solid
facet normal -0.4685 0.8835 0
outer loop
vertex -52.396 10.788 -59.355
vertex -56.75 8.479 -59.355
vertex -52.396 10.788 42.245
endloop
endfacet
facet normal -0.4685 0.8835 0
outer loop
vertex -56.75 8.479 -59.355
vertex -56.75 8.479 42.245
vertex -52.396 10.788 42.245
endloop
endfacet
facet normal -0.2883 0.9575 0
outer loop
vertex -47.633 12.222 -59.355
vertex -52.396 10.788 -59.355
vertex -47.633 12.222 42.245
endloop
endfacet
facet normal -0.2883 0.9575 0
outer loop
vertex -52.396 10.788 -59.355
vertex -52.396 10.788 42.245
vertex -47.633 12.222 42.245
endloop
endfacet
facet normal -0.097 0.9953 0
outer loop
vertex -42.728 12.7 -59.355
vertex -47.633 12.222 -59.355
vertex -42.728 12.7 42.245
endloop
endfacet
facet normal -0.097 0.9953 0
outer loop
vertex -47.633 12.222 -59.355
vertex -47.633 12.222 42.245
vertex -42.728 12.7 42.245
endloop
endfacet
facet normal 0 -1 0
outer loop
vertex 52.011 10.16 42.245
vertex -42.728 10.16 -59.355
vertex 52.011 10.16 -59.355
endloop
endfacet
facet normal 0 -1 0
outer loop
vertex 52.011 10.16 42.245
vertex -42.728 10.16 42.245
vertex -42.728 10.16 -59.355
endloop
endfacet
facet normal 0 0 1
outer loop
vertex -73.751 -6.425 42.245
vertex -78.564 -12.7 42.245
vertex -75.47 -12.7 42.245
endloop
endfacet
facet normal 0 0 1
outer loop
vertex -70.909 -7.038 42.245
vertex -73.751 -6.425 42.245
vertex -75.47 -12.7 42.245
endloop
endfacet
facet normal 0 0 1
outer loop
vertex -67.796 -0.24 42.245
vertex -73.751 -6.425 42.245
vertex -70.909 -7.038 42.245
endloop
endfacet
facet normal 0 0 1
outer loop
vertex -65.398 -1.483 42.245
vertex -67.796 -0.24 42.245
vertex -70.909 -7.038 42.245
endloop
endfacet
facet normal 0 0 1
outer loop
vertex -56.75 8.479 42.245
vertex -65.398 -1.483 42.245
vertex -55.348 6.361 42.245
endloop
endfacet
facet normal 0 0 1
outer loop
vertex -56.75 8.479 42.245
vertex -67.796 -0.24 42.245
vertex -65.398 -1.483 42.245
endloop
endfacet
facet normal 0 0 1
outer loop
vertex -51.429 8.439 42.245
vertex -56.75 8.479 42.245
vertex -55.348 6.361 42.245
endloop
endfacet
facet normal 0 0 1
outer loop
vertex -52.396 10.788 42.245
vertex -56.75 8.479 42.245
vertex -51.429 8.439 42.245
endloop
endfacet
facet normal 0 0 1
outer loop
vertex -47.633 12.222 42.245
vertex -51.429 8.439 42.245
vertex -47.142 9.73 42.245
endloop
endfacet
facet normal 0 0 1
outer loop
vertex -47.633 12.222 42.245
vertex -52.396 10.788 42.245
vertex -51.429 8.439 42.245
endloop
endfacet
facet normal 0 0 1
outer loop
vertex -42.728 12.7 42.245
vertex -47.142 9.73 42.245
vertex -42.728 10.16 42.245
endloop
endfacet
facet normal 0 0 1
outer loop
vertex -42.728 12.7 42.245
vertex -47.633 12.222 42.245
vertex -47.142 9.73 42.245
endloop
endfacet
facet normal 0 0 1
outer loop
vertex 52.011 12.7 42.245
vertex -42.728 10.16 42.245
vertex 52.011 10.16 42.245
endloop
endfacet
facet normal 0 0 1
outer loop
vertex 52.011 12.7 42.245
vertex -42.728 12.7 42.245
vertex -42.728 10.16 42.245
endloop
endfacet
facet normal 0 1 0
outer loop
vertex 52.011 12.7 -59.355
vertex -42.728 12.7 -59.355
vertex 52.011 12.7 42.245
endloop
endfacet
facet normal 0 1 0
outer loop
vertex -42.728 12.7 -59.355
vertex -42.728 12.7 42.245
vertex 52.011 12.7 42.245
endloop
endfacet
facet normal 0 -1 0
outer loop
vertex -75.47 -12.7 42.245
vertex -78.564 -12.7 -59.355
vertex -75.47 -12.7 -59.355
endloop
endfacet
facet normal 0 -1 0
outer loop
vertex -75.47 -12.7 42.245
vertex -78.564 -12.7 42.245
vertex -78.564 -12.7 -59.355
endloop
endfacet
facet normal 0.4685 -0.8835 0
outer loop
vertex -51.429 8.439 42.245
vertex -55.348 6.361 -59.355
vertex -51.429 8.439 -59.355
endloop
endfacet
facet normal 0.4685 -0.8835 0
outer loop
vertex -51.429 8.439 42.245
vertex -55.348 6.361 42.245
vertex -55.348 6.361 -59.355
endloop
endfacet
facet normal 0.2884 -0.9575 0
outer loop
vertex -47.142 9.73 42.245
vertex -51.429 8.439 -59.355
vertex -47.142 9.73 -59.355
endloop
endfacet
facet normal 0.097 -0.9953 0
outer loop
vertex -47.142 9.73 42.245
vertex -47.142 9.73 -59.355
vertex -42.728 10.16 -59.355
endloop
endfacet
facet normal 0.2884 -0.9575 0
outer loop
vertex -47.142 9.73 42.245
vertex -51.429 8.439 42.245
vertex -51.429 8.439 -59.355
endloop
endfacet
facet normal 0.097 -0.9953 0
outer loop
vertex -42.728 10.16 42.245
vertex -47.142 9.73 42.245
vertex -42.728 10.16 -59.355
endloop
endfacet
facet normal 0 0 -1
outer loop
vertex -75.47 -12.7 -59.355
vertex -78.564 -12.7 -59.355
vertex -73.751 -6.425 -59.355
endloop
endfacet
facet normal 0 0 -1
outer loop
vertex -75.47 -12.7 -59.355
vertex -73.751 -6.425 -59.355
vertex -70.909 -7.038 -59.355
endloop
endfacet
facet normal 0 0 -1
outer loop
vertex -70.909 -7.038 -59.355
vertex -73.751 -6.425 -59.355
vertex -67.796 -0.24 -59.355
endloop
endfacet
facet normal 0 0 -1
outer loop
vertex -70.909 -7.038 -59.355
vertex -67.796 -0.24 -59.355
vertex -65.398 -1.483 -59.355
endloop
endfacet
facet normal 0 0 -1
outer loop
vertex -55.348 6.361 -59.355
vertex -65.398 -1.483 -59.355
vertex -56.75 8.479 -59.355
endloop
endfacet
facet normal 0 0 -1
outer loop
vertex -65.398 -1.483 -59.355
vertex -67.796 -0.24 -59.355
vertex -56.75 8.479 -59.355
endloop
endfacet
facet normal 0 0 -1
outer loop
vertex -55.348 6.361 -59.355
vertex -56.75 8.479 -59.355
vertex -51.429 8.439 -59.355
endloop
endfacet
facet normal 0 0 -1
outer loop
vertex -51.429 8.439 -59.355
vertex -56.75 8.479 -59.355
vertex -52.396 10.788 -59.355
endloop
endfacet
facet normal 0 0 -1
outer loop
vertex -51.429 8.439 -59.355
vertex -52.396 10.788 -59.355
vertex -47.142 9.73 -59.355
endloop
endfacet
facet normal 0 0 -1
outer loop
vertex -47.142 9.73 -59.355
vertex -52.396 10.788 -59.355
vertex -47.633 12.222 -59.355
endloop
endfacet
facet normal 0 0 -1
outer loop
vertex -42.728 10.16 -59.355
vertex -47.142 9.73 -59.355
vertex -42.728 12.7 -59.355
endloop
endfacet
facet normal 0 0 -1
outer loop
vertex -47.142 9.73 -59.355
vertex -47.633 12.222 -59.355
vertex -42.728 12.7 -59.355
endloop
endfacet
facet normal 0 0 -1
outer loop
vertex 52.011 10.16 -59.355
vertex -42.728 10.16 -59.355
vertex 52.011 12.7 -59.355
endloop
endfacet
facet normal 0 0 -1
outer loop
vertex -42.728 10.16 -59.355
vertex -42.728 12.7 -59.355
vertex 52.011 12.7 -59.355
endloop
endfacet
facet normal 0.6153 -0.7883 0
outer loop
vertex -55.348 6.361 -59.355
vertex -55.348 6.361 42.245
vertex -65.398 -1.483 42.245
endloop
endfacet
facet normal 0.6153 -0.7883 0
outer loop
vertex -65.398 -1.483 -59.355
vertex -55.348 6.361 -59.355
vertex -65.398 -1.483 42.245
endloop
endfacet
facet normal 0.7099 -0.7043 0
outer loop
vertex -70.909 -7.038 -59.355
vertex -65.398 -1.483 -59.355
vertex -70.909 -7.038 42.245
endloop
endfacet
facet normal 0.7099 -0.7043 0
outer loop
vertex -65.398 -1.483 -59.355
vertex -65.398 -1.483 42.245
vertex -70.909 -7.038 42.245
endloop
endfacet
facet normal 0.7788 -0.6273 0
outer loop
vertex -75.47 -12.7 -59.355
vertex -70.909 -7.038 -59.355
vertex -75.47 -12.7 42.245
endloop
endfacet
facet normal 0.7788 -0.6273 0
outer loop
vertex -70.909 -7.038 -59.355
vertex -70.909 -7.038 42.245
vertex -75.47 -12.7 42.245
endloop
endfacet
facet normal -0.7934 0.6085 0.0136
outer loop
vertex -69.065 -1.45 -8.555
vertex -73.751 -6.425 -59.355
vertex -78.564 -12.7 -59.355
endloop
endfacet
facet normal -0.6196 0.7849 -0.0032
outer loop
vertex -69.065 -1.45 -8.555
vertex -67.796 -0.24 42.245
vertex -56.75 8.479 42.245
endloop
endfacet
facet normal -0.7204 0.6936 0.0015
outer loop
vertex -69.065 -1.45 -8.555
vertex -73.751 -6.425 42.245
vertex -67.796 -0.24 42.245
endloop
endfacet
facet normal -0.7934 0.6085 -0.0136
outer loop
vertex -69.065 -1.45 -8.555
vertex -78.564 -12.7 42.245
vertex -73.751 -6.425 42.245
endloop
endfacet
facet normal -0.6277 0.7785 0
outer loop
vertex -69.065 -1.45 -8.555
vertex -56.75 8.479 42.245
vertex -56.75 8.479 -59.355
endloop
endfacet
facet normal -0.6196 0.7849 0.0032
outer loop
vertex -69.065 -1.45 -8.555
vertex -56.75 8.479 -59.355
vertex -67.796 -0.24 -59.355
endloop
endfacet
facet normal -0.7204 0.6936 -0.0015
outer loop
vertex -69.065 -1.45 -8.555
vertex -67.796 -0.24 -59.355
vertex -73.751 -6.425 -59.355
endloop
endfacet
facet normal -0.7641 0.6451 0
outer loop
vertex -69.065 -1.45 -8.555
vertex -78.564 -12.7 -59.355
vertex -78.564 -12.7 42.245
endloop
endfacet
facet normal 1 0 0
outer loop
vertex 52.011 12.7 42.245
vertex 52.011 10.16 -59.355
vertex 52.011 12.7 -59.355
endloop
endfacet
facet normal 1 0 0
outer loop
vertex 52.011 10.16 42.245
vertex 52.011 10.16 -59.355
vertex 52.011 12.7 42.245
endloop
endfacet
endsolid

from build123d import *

# Parameters (mm, degrees)
F0_W     = 101.6
F0_H     = 101.6
F1_DEPTH = 12.7
F3_DEPTH = 101.6
F4_R     = 25.4
F5_T     = -2.54


# Not quite as in the source:
# - a feature of the source that left no trace in its solid (it failed there, or was rolled back) is left out


with BuildPart() as f1:
    # F0 (on Front) → F1 (new body, symmetric)
    with BuildSketch(Plane.XZ):
        with Locations((1.211412394, -8.554763478)):
            Rectangle(F0_W, F0_H)
    extrude(amount=F1_DEPTH, both=True)

    # F2 (on face) → F3 (join)
    with BuildSketch(Plane.XY.offset(42.245236522)):
        with BuildLine():
            Line((-49.588587606, -12.7), (-49.588587606, 12.7))
            add(Edge.make_bspline(
                [(-49.588587606, 12.7), (-67.7978310293, 3.2621913661), (-78.5642321364, -12.7)],
                knots=[1.1900846756, 1.1900846756, 1.1900846756, 2.1282604502, 2.1282604502, 2.1282604502], degree=2, weights=[1, 0.8919810006, 1]))
            Line((-78.5642321364, -12.7), (-49.588587606, -12.7))
        make_face()
    extrude(amount=-F3_DEPTH)

    # F4
    f4_edges = [f1.edges().sort_by_distance(p)[0] for p in [
        (-49.588588, 12.7, -8.554763),
    ]]
    fillet(f4_edges, radius=F4_R)

    # F5
    f5_openings = [f1.faces().sort_by_distance(p)[0] for p in [
        (-7.437576, -0.524073, 42.245237),
        (-13.27641, -12.7, -8.554763),
        (52.011412, 0, -8.554763),
        (-7.437576, -0.524073, -59.354763),
    ]]
    offset(amount=F5_T, openings=f5_openings)


solid = f1.part
